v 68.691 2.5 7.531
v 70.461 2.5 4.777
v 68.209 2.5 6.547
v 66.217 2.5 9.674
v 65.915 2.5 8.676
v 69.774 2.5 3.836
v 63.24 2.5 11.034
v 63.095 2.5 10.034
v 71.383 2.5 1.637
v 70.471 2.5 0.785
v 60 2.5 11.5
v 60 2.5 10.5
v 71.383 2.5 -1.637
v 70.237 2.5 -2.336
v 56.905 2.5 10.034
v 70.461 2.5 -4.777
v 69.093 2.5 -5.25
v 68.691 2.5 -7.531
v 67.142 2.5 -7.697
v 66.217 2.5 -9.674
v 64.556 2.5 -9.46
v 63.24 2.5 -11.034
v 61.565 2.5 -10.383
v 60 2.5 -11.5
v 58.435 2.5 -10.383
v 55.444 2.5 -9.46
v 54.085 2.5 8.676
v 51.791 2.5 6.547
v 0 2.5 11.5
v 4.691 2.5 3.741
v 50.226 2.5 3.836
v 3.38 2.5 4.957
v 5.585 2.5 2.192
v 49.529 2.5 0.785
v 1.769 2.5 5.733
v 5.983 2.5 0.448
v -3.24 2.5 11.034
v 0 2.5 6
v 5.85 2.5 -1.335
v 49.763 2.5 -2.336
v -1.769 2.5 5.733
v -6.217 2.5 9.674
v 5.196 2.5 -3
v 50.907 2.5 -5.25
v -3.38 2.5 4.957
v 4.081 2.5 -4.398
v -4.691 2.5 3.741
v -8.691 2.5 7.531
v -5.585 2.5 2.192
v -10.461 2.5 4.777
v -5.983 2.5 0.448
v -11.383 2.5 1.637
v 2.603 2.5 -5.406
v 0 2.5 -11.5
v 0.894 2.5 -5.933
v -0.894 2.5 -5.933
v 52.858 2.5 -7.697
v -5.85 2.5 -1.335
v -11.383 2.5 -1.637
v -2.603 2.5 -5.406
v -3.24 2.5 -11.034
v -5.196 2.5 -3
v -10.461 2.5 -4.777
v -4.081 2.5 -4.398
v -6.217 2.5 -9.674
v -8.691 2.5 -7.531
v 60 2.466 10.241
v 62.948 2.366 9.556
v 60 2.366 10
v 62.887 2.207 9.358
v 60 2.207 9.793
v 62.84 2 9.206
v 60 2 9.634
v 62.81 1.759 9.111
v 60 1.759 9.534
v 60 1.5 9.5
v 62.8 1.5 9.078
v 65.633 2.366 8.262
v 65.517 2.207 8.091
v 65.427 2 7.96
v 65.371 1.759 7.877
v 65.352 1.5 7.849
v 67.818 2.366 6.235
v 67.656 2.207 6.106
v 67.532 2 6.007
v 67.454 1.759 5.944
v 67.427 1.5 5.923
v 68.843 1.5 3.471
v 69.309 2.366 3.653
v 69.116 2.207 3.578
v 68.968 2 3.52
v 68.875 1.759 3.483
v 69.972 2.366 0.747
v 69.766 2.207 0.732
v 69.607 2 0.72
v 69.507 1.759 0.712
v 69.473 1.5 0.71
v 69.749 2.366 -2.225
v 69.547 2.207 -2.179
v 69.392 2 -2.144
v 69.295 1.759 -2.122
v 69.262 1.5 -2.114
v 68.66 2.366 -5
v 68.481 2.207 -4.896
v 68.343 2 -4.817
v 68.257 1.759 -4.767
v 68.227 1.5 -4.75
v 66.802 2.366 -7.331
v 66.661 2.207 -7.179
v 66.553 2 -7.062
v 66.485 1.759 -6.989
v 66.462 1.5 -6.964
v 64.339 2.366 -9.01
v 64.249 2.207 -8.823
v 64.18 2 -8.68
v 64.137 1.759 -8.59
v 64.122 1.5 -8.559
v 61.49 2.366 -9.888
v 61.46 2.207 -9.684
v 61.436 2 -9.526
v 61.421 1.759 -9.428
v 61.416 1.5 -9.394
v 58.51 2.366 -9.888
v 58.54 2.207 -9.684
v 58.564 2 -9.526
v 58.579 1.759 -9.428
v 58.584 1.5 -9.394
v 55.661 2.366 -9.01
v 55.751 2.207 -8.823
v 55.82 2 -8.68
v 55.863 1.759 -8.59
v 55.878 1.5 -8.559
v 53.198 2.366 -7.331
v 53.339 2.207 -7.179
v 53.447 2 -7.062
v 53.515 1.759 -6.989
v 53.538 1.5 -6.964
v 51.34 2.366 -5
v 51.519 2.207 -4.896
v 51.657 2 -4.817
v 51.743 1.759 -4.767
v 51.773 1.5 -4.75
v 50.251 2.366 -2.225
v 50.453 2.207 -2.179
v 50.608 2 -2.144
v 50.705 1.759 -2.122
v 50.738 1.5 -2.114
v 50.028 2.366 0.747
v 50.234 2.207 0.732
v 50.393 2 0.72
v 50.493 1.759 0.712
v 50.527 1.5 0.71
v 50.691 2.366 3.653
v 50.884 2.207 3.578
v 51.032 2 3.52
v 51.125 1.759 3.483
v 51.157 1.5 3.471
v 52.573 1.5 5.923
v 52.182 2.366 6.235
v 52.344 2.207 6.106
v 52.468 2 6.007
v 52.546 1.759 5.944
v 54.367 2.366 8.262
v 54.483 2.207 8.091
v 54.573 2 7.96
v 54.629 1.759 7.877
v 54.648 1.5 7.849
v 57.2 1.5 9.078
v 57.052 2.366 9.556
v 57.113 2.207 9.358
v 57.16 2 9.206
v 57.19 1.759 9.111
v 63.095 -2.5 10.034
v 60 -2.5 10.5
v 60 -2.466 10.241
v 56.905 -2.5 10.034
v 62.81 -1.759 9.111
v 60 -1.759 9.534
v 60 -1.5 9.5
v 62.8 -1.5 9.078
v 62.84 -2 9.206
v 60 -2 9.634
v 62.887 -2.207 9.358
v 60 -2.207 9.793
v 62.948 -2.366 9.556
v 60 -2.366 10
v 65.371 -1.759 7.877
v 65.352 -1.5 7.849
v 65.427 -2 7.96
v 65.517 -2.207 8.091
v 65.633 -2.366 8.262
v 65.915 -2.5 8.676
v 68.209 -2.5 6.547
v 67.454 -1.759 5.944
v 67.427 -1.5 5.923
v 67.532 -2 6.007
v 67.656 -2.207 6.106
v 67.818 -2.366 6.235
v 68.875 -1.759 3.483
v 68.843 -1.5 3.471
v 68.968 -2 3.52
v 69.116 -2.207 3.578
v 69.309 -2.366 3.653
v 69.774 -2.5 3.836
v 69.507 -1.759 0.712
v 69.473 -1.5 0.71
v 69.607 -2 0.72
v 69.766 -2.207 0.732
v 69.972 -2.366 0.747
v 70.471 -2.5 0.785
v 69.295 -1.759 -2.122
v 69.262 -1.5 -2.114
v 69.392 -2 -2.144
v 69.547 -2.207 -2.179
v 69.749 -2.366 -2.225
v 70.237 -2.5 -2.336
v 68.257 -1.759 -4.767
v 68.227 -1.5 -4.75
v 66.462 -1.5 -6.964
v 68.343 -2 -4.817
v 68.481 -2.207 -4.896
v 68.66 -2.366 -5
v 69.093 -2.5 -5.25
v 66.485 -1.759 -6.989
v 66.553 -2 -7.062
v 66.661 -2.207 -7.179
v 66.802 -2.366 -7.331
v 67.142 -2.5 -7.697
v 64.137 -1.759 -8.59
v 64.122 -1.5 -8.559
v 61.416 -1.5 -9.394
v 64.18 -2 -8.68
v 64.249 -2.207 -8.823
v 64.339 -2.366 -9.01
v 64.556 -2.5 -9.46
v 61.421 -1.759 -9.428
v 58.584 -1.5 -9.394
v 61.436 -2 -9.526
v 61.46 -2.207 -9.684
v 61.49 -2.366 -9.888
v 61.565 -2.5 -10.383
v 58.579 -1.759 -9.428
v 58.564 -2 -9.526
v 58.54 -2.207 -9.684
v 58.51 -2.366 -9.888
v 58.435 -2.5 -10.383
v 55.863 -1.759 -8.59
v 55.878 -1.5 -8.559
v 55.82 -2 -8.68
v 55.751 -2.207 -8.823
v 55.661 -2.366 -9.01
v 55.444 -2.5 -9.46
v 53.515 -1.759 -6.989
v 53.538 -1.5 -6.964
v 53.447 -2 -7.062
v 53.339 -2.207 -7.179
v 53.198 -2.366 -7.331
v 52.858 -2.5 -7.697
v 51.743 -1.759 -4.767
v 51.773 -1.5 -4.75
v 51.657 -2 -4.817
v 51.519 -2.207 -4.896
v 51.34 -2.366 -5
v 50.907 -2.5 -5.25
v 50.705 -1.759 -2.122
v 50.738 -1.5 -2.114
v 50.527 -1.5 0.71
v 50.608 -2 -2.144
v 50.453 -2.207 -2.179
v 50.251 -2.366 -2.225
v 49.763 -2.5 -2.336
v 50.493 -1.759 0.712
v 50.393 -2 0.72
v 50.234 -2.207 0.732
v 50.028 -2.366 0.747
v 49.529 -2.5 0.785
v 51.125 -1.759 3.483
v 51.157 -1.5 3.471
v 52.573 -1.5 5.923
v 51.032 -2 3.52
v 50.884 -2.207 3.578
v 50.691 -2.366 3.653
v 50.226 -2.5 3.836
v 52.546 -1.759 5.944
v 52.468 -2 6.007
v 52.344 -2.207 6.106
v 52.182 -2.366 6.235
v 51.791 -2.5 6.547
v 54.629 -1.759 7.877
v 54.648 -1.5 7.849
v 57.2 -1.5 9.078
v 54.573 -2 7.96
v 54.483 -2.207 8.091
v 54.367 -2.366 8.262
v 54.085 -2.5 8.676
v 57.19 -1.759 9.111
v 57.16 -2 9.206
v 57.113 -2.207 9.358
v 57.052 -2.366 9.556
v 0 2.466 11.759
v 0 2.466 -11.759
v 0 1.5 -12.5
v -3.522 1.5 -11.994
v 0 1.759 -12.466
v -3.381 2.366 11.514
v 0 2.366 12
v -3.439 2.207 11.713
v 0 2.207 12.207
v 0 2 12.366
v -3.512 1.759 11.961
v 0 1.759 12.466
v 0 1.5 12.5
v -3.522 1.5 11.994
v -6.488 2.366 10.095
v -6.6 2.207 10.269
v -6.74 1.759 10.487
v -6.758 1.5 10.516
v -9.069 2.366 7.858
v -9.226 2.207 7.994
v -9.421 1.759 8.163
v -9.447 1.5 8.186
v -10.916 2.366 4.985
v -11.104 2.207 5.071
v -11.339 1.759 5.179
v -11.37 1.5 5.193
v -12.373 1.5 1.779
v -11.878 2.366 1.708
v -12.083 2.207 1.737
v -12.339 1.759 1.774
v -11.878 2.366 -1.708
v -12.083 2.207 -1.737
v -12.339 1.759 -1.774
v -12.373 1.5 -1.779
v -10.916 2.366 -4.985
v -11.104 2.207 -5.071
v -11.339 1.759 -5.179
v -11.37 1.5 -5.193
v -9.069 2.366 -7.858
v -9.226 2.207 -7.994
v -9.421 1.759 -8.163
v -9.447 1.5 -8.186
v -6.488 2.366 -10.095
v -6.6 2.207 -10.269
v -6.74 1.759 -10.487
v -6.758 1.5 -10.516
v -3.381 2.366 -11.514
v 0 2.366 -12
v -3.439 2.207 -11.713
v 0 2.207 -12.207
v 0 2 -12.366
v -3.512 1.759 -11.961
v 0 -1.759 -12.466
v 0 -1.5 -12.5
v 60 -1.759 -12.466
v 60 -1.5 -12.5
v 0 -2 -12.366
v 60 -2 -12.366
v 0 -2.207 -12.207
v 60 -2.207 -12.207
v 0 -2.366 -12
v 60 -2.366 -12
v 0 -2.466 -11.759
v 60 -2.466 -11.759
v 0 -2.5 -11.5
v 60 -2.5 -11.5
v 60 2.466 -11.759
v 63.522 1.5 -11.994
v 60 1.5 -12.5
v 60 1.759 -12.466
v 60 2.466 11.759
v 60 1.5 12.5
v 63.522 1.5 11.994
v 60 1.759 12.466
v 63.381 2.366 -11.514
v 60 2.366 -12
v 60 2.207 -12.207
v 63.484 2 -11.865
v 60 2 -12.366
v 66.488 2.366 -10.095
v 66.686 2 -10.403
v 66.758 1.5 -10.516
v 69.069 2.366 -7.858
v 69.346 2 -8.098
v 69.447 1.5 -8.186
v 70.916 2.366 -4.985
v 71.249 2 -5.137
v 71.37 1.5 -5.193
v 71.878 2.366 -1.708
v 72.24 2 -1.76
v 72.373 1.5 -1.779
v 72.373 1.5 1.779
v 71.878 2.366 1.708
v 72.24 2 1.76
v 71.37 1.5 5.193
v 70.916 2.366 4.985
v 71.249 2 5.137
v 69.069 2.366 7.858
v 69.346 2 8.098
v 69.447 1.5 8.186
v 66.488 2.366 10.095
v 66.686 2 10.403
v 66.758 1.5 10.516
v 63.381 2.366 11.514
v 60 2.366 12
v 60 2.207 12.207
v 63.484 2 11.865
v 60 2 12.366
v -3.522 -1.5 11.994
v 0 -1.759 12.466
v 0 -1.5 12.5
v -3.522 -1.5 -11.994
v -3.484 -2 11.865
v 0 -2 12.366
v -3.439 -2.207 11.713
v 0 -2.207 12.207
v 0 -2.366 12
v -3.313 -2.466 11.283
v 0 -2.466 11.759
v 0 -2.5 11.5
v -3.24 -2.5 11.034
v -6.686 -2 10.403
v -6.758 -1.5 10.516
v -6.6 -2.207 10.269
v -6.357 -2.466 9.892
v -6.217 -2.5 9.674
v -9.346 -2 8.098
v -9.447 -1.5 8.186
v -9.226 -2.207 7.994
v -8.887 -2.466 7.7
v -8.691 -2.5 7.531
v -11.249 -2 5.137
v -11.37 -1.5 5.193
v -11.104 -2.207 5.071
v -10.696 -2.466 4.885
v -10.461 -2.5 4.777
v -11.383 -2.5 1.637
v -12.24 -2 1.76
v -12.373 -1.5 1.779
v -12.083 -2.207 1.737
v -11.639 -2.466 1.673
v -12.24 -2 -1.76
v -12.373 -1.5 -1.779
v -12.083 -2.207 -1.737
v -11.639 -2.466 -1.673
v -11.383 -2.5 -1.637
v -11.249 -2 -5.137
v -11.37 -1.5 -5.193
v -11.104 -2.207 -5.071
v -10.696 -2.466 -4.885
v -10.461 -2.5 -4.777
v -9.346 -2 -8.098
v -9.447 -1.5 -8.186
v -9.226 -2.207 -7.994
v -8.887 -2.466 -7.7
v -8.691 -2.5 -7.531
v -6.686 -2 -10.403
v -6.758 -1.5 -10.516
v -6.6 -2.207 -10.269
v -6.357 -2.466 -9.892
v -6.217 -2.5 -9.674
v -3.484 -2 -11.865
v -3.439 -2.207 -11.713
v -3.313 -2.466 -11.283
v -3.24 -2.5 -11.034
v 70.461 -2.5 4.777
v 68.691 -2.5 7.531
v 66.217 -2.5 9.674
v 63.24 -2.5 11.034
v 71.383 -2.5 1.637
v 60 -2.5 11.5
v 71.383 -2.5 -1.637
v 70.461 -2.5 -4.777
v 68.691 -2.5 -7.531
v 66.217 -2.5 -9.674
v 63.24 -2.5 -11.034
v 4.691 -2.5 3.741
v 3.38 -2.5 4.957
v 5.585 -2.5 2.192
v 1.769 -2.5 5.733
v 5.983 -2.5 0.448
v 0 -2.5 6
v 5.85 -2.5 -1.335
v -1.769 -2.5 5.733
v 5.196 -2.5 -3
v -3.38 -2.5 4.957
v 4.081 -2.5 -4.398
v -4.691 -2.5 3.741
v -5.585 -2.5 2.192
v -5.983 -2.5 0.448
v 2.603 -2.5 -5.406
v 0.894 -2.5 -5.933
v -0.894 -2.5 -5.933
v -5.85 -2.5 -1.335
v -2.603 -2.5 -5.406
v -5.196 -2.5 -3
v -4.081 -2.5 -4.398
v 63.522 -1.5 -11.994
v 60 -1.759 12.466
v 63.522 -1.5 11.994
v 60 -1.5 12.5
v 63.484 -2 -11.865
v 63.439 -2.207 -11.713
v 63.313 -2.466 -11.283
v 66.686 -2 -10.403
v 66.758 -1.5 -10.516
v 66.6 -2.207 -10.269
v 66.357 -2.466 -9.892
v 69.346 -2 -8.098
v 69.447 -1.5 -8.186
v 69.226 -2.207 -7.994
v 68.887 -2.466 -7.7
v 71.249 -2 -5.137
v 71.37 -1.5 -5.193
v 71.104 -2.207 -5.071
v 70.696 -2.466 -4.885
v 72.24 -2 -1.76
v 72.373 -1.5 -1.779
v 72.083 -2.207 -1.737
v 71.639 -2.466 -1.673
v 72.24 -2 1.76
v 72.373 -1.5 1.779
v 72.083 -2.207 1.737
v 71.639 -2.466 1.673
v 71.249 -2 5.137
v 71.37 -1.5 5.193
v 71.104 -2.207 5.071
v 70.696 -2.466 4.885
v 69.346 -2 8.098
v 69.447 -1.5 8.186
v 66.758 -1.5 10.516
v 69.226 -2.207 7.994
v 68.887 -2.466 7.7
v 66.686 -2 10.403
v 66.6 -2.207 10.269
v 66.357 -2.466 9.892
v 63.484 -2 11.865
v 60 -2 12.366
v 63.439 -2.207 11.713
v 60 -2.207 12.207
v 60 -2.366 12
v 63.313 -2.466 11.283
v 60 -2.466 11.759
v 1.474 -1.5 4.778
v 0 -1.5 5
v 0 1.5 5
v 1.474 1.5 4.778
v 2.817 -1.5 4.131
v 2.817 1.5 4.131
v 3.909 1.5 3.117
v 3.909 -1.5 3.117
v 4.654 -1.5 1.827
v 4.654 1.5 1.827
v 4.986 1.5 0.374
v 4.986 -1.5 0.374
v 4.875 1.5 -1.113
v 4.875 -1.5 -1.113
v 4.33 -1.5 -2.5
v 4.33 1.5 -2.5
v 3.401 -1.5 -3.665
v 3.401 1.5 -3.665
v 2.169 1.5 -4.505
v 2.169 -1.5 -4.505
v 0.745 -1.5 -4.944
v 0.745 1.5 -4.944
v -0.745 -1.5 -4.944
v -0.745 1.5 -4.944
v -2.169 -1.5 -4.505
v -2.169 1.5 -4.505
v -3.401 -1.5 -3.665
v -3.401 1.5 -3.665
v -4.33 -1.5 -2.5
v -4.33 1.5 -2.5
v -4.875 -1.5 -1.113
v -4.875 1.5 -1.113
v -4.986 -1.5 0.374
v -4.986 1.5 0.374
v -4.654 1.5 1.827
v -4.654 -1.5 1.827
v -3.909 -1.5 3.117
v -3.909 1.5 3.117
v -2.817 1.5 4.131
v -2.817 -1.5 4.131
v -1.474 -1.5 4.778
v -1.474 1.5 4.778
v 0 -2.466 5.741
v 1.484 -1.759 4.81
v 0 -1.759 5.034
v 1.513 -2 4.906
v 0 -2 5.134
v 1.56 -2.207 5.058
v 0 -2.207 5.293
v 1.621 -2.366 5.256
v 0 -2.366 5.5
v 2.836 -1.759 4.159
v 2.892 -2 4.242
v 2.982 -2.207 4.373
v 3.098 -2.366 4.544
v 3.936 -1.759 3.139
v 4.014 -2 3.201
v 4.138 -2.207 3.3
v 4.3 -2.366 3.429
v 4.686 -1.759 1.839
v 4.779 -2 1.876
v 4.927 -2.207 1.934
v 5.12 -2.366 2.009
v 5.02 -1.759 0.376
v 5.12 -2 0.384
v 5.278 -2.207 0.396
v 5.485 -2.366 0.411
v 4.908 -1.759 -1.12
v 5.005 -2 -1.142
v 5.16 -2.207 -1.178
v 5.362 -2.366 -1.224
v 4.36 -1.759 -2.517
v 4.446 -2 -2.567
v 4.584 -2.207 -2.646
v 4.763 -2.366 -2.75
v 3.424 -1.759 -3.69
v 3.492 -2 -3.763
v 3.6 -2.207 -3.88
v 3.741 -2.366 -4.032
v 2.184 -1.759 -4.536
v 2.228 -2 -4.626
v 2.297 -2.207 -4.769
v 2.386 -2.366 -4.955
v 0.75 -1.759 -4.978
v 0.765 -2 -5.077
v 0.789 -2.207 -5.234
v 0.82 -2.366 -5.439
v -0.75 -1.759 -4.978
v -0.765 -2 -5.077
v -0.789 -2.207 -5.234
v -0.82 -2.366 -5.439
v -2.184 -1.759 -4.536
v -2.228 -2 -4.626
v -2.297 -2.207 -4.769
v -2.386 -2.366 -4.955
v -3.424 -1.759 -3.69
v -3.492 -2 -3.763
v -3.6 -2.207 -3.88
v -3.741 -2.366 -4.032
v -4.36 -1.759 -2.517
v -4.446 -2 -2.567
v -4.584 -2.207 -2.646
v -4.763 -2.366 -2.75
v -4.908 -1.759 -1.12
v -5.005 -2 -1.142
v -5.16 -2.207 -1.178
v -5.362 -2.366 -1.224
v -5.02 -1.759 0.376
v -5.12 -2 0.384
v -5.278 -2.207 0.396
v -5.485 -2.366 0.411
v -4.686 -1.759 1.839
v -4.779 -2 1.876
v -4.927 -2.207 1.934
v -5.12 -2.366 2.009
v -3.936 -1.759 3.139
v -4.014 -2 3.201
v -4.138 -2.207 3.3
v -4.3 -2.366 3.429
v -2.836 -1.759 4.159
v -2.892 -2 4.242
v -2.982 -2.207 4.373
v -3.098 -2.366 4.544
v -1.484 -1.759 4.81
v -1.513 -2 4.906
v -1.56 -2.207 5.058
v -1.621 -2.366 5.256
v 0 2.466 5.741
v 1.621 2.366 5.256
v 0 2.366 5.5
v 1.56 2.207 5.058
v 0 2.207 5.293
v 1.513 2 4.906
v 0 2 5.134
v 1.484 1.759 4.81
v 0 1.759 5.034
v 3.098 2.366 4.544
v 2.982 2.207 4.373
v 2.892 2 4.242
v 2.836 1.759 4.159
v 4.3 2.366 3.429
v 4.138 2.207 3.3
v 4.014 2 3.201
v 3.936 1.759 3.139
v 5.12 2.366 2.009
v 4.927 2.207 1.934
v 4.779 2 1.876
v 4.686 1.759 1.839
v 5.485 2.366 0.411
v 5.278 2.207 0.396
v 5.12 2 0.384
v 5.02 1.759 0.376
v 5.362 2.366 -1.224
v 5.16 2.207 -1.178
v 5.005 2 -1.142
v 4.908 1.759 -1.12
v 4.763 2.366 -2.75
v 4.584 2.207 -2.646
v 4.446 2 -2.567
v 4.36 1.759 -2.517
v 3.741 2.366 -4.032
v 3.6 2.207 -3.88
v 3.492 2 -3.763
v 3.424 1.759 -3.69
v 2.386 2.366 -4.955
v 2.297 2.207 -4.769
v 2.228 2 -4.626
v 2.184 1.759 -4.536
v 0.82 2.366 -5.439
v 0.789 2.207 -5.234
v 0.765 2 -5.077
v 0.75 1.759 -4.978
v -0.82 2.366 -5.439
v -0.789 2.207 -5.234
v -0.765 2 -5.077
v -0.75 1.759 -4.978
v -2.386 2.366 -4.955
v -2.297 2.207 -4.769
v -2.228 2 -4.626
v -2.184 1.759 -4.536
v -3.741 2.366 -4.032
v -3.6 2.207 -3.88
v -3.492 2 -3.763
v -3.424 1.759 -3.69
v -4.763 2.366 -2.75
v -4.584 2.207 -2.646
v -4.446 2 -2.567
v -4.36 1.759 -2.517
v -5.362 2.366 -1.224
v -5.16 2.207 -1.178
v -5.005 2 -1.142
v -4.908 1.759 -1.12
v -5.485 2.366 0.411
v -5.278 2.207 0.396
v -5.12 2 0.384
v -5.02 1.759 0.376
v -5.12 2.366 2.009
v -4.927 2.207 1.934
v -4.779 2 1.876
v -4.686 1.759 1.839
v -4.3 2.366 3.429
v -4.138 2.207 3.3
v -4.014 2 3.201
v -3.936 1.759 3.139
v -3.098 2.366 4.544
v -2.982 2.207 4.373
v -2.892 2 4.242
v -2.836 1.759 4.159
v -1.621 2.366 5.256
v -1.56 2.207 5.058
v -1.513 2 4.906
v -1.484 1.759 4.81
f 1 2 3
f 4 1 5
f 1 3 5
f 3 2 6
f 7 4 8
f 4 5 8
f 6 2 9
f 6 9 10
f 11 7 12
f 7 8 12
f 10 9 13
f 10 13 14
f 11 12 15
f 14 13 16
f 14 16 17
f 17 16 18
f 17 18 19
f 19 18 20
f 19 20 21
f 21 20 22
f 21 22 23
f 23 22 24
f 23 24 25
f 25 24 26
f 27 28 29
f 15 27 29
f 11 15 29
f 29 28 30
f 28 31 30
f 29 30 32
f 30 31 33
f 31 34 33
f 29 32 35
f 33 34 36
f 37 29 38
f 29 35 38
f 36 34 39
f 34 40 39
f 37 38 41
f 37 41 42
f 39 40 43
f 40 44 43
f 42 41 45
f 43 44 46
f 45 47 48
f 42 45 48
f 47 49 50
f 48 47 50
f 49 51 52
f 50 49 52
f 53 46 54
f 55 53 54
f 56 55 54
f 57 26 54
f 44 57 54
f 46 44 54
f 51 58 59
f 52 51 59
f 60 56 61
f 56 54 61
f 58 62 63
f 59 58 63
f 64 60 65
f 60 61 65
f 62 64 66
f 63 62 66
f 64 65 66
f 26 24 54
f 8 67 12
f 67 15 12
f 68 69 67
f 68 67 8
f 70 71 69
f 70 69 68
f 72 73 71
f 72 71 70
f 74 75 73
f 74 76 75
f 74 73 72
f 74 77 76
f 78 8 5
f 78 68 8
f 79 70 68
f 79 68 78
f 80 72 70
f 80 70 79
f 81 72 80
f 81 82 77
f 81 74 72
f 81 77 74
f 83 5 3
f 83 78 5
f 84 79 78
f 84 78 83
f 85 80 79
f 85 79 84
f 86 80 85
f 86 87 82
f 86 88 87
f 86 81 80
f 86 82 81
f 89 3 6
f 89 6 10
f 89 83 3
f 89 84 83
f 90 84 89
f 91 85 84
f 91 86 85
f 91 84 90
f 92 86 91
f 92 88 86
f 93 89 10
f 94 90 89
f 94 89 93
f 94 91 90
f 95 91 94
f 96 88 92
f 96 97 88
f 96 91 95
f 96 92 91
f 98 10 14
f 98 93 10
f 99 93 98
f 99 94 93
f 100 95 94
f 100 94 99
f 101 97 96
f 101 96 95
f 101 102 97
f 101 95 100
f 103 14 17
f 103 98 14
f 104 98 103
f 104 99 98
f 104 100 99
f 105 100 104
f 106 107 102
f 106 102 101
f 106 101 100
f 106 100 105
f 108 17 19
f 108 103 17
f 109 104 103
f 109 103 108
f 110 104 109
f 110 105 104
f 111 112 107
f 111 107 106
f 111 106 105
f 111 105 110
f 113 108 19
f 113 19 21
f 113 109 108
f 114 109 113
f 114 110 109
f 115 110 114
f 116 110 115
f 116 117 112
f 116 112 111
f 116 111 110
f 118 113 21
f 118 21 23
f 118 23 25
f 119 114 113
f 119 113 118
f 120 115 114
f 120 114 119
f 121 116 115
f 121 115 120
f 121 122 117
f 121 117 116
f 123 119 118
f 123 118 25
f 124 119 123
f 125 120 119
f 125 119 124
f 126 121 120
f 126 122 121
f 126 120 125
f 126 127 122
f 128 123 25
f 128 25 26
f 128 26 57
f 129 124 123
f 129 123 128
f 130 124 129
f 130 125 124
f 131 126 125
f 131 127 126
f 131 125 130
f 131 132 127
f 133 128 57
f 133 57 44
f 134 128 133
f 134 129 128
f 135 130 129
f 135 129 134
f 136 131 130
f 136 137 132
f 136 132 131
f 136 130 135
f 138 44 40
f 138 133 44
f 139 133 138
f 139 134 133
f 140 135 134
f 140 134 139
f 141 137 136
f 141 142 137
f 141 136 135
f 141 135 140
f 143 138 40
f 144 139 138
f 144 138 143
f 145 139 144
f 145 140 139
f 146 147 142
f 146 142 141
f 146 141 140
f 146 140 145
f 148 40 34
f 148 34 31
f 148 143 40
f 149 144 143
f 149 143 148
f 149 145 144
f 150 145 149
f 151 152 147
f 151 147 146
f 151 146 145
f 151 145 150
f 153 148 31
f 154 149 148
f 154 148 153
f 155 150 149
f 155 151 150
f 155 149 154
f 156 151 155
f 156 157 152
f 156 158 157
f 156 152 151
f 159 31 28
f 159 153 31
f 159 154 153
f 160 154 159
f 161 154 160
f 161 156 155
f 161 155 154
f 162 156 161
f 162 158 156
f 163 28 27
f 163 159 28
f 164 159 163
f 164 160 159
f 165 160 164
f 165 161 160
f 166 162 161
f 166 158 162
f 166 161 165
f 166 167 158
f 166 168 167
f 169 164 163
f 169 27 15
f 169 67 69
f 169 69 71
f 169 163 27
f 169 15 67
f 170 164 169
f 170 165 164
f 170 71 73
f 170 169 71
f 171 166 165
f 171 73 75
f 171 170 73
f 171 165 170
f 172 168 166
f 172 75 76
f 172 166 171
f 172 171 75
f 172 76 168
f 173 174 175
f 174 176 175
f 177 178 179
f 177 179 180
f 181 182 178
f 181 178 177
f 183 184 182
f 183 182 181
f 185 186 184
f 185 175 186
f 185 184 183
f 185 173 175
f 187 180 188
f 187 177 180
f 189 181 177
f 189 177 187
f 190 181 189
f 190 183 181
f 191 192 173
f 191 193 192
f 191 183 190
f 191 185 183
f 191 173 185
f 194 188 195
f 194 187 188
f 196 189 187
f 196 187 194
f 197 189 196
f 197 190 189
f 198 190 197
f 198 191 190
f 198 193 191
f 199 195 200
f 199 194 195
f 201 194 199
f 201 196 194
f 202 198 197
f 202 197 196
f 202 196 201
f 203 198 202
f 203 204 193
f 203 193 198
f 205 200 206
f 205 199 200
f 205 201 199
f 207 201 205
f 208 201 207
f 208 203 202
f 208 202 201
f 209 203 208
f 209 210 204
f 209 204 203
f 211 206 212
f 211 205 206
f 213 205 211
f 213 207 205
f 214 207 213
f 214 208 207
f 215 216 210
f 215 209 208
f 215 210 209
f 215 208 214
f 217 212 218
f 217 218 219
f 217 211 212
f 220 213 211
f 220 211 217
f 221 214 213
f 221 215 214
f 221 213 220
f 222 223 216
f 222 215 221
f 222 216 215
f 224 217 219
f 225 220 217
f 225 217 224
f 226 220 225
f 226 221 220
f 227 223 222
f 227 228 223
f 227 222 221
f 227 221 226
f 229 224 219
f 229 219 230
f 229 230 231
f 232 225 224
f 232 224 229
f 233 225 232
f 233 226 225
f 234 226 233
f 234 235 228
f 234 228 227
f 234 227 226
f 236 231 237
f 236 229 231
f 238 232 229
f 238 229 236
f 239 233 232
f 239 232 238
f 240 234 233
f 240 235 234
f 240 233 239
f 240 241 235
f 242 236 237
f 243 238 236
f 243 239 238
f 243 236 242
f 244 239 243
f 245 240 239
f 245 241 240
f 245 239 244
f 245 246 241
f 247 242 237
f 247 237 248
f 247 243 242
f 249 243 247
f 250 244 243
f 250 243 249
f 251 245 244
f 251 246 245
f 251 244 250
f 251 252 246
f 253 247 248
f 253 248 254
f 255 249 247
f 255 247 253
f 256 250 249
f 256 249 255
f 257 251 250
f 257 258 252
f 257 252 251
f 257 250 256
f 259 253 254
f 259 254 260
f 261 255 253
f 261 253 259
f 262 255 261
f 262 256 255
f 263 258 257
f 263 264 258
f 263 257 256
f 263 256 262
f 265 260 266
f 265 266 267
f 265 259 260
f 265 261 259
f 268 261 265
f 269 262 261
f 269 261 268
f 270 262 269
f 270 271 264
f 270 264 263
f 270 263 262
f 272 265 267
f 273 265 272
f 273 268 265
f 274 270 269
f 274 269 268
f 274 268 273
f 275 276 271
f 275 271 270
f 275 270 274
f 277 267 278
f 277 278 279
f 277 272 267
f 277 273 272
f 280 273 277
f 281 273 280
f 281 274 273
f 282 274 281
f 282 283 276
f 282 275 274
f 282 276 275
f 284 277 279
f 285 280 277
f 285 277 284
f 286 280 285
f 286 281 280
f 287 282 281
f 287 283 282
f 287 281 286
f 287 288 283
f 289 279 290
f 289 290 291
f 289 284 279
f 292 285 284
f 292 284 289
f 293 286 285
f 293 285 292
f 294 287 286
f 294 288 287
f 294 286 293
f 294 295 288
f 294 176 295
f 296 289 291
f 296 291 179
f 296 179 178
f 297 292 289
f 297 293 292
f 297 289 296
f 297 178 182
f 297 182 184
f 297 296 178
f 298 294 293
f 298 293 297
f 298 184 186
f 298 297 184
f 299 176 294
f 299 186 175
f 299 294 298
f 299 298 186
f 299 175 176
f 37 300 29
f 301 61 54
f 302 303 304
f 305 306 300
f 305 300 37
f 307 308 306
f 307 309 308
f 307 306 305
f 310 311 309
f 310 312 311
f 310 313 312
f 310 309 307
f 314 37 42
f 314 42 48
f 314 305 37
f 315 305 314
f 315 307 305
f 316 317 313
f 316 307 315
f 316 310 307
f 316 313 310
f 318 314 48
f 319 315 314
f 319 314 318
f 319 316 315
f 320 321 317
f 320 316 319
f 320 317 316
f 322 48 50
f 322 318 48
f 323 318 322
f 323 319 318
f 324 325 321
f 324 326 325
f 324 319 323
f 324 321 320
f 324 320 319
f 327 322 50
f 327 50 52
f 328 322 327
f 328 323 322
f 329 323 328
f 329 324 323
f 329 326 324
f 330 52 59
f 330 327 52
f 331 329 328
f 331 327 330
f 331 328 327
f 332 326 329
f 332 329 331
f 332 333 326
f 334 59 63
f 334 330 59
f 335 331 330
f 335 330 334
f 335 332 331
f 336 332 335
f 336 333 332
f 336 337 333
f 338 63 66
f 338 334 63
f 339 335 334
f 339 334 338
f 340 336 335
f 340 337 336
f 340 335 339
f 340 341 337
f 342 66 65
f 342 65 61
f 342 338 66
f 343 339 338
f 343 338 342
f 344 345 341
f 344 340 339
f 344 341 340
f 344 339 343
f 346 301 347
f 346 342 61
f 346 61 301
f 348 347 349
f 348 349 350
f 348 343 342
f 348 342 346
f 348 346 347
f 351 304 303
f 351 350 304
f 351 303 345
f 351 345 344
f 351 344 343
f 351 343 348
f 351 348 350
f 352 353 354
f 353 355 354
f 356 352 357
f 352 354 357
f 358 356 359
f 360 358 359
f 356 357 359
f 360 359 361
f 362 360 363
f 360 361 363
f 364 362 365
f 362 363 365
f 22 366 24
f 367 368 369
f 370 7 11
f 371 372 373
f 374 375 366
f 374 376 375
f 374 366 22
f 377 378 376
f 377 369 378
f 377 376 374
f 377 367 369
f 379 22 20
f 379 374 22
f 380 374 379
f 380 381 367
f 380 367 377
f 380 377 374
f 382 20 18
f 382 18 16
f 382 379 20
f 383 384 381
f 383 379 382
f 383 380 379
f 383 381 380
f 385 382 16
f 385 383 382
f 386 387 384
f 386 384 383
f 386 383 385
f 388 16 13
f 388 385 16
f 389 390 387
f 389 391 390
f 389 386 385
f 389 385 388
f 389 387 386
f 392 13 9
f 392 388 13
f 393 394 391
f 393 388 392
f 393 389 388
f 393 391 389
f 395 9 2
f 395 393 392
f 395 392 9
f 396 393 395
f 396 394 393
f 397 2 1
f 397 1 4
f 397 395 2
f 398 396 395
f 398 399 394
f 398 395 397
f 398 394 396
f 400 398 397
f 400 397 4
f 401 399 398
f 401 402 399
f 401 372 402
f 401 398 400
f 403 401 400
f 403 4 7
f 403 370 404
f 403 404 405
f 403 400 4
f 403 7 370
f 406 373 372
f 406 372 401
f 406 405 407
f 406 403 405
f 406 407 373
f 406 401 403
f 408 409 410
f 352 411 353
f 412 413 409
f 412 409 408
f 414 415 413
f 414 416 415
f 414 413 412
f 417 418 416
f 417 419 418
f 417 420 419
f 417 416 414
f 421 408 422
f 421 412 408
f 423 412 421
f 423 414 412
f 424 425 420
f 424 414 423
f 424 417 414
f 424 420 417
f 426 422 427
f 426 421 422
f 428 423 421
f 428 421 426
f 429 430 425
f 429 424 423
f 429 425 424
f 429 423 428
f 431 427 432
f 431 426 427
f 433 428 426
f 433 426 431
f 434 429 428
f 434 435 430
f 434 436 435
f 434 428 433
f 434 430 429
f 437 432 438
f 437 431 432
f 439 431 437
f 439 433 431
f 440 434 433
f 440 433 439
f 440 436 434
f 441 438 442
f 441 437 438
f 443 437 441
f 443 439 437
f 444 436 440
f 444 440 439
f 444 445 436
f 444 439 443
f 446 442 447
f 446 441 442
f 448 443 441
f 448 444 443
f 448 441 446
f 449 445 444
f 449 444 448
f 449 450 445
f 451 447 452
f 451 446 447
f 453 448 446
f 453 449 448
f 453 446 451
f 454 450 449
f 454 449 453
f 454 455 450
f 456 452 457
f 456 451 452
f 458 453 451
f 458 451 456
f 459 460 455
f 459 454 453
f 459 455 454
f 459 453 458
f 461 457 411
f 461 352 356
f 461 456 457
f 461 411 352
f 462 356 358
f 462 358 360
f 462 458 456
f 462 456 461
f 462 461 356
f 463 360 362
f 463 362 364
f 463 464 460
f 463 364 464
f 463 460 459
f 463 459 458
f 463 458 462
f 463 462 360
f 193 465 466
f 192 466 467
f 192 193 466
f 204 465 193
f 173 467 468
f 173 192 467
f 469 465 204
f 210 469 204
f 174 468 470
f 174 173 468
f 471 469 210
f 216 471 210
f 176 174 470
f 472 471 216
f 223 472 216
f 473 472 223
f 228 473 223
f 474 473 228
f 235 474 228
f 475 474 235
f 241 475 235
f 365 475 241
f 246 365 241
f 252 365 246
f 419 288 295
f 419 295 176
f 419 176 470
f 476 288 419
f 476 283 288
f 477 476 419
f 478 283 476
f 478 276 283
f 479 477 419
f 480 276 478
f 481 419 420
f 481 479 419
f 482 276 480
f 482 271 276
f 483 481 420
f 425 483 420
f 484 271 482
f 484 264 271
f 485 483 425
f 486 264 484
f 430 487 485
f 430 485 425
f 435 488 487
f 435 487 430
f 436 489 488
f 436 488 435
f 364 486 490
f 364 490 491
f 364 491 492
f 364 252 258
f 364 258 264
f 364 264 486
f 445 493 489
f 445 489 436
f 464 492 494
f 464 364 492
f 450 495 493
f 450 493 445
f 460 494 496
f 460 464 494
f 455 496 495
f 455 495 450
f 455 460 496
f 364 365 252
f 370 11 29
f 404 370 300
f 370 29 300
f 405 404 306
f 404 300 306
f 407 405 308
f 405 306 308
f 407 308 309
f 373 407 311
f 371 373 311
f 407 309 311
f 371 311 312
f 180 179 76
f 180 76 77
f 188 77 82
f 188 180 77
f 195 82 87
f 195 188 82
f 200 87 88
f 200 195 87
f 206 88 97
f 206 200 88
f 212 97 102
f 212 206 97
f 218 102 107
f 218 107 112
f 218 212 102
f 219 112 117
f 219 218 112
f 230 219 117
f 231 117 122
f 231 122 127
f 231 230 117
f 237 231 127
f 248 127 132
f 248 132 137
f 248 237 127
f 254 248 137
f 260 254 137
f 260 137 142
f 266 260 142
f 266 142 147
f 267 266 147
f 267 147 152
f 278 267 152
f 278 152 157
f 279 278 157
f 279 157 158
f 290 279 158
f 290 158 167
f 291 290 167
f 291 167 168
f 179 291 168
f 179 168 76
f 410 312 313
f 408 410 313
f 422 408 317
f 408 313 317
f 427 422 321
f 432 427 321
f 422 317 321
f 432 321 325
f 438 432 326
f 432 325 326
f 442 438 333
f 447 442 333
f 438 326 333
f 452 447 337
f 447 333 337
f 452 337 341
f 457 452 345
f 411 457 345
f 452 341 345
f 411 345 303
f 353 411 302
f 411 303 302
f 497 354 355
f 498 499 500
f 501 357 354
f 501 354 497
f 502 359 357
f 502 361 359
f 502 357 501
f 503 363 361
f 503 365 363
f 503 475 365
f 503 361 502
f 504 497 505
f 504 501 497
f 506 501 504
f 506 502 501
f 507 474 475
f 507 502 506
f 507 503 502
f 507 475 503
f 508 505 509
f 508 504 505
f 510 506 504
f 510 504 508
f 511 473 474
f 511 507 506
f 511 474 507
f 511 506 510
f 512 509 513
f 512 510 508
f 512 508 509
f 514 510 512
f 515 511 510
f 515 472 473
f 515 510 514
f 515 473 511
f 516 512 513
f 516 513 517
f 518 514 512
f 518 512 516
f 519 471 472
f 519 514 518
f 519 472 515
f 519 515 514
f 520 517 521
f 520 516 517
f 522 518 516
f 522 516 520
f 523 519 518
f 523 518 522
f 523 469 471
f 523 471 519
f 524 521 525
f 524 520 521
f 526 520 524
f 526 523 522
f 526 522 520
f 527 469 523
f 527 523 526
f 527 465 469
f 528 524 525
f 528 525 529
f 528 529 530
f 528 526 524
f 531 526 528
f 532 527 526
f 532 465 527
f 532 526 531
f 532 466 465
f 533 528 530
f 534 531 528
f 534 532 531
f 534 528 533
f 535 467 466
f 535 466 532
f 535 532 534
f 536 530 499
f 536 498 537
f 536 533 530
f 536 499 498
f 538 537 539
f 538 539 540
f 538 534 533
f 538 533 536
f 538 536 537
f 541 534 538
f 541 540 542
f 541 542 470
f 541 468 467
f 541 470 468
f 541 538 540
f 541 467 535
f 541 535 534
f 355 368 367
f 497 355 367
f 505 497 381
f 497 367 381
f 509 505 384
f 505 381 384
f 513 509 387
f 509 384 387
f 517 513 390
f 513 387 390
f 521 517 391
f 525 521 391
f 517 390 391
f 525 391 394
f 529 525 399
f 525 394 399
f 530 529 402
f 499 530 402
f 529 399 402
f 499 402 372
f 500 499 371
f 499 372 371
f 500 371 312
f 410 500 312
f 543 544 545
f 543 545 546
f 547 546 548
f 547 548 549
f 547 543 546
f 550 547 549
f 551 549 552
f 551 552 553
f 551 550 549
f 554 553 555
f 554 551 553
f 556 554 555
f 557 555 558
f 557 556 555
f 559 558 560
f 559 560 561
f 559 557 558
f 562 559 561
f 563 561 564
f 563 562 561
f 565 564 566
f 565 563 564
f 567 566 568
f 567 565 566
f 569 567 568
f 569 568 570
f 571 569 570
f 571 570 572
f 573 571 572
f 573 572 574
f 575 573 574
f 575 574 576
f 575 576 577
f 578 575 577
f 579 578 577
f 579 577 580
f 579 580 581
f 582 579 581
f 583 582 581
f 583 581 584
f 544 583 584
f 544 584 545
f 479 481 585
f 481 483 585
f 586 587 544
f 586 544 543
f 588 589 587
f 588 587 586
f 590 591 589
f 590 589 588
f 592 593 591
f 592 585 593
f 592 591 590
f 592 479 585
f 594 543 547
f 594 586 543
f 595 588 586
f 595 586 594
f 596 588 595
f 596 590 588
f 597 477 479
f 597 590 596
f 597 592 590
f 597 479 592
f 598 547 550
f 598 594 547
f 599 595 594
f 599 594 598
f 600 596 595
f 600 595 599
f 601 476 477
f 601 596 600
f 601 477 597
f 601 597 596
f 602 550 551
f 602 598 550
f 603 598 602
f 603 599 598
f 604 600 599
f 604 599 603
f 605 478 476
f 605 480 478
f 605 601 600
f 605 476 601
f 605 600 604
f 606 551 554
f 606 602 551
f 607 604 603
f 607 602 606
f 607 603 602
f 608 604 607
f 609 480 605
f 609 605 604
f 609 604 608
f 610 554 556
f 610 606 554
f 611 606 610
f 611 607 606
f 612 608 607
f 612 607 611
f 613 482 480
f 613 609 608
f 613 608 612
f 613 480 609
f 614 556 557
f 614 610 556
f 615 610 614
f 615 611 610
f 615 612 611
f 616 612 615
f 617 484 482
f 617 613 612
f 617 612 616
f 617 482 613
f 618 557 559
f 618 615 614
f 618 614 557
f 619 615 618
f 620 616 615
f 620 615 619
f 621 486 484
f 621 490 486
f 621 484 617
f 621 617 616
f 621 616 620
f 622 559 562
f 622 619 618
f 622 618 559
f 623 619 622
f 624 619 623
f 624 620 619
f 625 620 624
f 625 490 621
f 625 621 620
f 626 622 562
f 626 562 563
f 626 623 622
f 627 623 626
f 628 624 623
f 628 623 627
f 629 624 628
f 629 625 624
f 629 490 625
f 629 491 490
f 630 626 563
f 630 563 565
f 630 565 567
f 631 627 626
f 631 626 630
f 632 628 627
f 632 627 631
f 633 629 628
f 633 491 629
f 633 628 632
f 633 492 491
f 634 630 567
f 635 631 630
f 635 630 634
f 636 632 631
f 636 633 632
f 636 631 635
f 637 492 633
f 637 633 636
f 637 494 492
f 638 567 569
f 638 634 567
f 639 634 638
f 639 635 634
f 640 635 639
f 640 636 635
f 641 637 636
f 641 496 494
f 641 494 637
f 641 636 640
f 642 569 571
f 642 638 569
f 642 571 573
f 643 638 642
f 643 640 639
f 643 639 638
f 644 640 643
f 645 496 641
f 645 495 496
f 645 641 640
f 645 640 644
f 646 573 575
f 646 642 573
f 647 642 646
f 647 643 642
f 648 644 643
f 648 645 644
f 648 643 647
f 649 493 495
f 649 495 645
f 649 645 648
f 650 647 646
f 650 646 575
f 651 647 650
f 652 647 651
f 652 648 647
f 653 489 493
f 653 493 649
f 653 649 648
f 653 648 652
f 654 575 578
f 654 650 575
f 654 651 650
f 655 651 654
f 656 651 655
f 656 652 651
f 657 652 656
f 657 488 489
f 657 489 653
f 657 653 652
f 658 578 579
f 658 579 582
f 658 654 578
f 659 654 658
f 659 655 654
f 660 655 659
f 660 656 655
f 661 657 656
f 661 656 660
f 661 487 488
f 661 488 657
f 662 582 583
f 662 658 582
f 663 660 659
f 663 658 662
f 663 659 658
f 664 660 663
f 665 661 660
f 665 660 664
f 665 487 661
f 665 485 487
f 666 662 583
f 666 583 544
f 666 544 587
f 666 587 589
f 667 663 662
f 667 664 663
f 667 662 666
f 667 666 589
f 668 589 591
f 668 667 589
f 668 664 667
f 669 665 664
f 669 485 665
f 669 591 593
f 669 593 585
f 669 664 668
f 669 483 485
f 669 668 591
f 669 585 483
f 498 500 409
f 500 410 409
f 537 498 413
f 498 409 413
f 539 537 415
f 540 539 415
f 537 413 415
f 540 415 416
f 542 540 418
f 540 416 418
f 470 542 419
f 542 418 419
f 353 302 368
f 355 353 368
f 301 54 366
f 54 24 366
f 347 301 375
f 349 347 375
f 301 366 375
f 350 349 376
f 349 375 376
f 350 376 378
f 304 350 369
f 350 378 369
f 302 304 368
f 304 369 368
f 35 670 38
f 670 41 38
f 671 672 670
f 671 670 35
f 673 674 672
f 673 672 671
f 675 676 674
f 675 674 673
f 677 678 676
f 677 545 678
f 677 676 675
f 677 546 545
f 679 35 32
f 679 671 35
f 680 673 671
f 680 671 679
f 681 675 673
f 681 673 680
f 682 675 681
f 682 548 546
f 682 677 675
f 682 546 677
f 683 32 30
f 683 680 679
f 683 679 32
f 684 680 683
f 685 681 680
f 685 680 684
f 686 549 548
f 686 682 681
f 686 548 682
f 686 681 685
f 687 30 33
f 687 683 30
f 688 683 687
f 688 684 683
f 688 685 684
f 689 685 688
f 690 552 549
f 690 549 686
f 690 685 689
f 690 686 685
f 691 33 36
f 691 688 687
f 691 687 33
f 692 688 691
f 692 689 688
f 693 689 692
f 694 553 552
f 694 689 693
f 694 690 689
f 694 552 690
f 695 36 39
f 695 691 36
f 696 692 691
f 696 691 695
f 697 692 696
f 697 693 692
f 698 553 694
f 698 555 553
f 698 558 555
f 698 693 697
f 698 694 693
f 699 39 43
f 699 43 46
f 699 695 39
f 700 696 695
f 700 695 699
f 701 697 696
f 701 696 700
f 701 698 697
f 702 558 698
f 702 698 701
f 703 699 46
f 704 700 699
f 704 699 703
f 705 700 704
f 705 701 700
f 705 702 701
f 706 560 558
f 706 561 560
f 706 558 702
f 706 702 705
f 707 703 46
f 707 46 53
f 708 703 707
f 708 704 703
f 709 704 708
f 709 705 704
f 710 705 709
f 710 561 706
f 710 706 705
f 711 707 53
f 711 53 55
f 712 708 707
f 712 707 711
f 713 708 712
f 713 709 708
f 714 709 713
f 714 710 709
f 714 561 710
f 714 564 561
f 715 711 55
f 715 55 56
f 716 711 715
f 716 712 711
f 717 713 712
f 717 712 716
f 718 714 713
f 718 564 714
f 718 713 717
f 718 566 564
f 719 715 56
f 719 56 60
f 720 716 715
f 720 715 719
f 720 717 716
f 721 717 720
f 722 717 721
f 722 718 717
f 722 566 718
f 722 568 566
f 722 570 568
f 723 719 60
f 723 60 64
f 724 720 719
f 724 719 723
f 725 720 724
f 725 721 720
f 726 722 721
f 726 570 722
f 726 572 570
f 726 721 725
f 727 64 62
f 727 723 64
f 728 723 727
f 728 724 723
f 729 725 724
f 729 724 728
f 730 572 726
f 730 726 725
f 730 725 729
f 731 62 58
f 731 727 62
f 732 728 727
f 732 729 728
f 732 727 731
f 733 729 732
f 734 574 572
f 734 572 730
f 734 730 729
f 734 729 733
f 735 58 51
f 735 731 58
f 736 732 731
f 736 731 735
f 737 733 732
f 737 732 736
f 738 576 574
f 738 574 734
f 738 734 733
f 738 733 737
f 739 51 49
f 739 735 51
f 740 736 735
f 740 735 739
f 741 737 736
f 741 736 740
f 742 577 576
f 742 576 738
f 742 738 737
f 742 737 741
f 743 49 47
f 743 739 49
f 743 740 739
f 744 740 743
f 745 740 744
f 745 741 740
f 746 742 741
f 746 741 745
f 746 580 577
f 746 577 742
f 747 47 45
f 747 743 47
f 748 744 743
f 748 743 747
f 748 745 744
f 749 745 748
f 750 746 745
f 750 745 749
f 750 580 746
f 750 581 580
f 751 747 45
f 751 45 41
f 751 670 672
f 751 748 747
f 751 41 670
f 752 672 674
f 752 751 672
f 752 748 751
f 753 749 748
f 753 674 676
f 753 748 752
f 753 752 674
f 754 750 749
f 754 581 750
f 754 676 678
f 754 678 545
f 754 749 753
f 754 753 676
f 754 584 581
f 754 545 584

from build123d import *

# Parameters (mm, degrees)
SKETCH1_R           = 5
SKETCH1_R_2         = 9.5
BOSS_EXTRUDE1_DEPTH = 2.5
FILLET1_R           = 1


with BuildPart() as part:
    # Sketch1 → Boss-Extrude1 (new, symmetric)
    with BuildSketch(Plane(origin=(0, 0, 0), x_dir=(1, 0, 0), z_dir=(0, 1, 0))):
        with BuildLine():
            Line((0, 12.5), (60, 12.5))
            ThreePointArc((60, 12.5), (72.5, 0), (60, -12.5))
            Line((60, -12.5), (0, -12.5))
            ThreePointArc((0, -12.5), (-12.5, 0), (0, 12.5))
        make_face()
        with Locations(Location((0, 0, 0), (0, 0, 270))):
            Circle(SKETCH1_R, mode=Mode.SUBTRACT)
        with Locations(Location((60, 0, 0), (0, 0, 270))):
            Circle(SKETCH1_R_2, mode=Mode.SUBTRACT)
    extrude(amount=BOSS_EXTRUDE1_DEPTH, both=True)

    # Fillet1
    fillet1_edges = [part.edges().sort_by_distance(p)[0] for p in [
        (0, -2.5, -5),
        (0, 2.5, -5),
        (72.5, 2.5, 0),
        (60, -2.5, -9.5),
        (60, 2.5, -9.5),
        (30, 2.5, -12.5),
        (-12.5, 2.5, 0),
        (30, -2.5, -12.5),
        (72.5, -2.5, 0),
        (30, -2.5, 12.5),
        (-12.5, -2.5, 0),
        (30, 2.5, 12.5),
    ]]
    fillet(fillet1_edges, radius=FILLET1_R)


solid = part.part
